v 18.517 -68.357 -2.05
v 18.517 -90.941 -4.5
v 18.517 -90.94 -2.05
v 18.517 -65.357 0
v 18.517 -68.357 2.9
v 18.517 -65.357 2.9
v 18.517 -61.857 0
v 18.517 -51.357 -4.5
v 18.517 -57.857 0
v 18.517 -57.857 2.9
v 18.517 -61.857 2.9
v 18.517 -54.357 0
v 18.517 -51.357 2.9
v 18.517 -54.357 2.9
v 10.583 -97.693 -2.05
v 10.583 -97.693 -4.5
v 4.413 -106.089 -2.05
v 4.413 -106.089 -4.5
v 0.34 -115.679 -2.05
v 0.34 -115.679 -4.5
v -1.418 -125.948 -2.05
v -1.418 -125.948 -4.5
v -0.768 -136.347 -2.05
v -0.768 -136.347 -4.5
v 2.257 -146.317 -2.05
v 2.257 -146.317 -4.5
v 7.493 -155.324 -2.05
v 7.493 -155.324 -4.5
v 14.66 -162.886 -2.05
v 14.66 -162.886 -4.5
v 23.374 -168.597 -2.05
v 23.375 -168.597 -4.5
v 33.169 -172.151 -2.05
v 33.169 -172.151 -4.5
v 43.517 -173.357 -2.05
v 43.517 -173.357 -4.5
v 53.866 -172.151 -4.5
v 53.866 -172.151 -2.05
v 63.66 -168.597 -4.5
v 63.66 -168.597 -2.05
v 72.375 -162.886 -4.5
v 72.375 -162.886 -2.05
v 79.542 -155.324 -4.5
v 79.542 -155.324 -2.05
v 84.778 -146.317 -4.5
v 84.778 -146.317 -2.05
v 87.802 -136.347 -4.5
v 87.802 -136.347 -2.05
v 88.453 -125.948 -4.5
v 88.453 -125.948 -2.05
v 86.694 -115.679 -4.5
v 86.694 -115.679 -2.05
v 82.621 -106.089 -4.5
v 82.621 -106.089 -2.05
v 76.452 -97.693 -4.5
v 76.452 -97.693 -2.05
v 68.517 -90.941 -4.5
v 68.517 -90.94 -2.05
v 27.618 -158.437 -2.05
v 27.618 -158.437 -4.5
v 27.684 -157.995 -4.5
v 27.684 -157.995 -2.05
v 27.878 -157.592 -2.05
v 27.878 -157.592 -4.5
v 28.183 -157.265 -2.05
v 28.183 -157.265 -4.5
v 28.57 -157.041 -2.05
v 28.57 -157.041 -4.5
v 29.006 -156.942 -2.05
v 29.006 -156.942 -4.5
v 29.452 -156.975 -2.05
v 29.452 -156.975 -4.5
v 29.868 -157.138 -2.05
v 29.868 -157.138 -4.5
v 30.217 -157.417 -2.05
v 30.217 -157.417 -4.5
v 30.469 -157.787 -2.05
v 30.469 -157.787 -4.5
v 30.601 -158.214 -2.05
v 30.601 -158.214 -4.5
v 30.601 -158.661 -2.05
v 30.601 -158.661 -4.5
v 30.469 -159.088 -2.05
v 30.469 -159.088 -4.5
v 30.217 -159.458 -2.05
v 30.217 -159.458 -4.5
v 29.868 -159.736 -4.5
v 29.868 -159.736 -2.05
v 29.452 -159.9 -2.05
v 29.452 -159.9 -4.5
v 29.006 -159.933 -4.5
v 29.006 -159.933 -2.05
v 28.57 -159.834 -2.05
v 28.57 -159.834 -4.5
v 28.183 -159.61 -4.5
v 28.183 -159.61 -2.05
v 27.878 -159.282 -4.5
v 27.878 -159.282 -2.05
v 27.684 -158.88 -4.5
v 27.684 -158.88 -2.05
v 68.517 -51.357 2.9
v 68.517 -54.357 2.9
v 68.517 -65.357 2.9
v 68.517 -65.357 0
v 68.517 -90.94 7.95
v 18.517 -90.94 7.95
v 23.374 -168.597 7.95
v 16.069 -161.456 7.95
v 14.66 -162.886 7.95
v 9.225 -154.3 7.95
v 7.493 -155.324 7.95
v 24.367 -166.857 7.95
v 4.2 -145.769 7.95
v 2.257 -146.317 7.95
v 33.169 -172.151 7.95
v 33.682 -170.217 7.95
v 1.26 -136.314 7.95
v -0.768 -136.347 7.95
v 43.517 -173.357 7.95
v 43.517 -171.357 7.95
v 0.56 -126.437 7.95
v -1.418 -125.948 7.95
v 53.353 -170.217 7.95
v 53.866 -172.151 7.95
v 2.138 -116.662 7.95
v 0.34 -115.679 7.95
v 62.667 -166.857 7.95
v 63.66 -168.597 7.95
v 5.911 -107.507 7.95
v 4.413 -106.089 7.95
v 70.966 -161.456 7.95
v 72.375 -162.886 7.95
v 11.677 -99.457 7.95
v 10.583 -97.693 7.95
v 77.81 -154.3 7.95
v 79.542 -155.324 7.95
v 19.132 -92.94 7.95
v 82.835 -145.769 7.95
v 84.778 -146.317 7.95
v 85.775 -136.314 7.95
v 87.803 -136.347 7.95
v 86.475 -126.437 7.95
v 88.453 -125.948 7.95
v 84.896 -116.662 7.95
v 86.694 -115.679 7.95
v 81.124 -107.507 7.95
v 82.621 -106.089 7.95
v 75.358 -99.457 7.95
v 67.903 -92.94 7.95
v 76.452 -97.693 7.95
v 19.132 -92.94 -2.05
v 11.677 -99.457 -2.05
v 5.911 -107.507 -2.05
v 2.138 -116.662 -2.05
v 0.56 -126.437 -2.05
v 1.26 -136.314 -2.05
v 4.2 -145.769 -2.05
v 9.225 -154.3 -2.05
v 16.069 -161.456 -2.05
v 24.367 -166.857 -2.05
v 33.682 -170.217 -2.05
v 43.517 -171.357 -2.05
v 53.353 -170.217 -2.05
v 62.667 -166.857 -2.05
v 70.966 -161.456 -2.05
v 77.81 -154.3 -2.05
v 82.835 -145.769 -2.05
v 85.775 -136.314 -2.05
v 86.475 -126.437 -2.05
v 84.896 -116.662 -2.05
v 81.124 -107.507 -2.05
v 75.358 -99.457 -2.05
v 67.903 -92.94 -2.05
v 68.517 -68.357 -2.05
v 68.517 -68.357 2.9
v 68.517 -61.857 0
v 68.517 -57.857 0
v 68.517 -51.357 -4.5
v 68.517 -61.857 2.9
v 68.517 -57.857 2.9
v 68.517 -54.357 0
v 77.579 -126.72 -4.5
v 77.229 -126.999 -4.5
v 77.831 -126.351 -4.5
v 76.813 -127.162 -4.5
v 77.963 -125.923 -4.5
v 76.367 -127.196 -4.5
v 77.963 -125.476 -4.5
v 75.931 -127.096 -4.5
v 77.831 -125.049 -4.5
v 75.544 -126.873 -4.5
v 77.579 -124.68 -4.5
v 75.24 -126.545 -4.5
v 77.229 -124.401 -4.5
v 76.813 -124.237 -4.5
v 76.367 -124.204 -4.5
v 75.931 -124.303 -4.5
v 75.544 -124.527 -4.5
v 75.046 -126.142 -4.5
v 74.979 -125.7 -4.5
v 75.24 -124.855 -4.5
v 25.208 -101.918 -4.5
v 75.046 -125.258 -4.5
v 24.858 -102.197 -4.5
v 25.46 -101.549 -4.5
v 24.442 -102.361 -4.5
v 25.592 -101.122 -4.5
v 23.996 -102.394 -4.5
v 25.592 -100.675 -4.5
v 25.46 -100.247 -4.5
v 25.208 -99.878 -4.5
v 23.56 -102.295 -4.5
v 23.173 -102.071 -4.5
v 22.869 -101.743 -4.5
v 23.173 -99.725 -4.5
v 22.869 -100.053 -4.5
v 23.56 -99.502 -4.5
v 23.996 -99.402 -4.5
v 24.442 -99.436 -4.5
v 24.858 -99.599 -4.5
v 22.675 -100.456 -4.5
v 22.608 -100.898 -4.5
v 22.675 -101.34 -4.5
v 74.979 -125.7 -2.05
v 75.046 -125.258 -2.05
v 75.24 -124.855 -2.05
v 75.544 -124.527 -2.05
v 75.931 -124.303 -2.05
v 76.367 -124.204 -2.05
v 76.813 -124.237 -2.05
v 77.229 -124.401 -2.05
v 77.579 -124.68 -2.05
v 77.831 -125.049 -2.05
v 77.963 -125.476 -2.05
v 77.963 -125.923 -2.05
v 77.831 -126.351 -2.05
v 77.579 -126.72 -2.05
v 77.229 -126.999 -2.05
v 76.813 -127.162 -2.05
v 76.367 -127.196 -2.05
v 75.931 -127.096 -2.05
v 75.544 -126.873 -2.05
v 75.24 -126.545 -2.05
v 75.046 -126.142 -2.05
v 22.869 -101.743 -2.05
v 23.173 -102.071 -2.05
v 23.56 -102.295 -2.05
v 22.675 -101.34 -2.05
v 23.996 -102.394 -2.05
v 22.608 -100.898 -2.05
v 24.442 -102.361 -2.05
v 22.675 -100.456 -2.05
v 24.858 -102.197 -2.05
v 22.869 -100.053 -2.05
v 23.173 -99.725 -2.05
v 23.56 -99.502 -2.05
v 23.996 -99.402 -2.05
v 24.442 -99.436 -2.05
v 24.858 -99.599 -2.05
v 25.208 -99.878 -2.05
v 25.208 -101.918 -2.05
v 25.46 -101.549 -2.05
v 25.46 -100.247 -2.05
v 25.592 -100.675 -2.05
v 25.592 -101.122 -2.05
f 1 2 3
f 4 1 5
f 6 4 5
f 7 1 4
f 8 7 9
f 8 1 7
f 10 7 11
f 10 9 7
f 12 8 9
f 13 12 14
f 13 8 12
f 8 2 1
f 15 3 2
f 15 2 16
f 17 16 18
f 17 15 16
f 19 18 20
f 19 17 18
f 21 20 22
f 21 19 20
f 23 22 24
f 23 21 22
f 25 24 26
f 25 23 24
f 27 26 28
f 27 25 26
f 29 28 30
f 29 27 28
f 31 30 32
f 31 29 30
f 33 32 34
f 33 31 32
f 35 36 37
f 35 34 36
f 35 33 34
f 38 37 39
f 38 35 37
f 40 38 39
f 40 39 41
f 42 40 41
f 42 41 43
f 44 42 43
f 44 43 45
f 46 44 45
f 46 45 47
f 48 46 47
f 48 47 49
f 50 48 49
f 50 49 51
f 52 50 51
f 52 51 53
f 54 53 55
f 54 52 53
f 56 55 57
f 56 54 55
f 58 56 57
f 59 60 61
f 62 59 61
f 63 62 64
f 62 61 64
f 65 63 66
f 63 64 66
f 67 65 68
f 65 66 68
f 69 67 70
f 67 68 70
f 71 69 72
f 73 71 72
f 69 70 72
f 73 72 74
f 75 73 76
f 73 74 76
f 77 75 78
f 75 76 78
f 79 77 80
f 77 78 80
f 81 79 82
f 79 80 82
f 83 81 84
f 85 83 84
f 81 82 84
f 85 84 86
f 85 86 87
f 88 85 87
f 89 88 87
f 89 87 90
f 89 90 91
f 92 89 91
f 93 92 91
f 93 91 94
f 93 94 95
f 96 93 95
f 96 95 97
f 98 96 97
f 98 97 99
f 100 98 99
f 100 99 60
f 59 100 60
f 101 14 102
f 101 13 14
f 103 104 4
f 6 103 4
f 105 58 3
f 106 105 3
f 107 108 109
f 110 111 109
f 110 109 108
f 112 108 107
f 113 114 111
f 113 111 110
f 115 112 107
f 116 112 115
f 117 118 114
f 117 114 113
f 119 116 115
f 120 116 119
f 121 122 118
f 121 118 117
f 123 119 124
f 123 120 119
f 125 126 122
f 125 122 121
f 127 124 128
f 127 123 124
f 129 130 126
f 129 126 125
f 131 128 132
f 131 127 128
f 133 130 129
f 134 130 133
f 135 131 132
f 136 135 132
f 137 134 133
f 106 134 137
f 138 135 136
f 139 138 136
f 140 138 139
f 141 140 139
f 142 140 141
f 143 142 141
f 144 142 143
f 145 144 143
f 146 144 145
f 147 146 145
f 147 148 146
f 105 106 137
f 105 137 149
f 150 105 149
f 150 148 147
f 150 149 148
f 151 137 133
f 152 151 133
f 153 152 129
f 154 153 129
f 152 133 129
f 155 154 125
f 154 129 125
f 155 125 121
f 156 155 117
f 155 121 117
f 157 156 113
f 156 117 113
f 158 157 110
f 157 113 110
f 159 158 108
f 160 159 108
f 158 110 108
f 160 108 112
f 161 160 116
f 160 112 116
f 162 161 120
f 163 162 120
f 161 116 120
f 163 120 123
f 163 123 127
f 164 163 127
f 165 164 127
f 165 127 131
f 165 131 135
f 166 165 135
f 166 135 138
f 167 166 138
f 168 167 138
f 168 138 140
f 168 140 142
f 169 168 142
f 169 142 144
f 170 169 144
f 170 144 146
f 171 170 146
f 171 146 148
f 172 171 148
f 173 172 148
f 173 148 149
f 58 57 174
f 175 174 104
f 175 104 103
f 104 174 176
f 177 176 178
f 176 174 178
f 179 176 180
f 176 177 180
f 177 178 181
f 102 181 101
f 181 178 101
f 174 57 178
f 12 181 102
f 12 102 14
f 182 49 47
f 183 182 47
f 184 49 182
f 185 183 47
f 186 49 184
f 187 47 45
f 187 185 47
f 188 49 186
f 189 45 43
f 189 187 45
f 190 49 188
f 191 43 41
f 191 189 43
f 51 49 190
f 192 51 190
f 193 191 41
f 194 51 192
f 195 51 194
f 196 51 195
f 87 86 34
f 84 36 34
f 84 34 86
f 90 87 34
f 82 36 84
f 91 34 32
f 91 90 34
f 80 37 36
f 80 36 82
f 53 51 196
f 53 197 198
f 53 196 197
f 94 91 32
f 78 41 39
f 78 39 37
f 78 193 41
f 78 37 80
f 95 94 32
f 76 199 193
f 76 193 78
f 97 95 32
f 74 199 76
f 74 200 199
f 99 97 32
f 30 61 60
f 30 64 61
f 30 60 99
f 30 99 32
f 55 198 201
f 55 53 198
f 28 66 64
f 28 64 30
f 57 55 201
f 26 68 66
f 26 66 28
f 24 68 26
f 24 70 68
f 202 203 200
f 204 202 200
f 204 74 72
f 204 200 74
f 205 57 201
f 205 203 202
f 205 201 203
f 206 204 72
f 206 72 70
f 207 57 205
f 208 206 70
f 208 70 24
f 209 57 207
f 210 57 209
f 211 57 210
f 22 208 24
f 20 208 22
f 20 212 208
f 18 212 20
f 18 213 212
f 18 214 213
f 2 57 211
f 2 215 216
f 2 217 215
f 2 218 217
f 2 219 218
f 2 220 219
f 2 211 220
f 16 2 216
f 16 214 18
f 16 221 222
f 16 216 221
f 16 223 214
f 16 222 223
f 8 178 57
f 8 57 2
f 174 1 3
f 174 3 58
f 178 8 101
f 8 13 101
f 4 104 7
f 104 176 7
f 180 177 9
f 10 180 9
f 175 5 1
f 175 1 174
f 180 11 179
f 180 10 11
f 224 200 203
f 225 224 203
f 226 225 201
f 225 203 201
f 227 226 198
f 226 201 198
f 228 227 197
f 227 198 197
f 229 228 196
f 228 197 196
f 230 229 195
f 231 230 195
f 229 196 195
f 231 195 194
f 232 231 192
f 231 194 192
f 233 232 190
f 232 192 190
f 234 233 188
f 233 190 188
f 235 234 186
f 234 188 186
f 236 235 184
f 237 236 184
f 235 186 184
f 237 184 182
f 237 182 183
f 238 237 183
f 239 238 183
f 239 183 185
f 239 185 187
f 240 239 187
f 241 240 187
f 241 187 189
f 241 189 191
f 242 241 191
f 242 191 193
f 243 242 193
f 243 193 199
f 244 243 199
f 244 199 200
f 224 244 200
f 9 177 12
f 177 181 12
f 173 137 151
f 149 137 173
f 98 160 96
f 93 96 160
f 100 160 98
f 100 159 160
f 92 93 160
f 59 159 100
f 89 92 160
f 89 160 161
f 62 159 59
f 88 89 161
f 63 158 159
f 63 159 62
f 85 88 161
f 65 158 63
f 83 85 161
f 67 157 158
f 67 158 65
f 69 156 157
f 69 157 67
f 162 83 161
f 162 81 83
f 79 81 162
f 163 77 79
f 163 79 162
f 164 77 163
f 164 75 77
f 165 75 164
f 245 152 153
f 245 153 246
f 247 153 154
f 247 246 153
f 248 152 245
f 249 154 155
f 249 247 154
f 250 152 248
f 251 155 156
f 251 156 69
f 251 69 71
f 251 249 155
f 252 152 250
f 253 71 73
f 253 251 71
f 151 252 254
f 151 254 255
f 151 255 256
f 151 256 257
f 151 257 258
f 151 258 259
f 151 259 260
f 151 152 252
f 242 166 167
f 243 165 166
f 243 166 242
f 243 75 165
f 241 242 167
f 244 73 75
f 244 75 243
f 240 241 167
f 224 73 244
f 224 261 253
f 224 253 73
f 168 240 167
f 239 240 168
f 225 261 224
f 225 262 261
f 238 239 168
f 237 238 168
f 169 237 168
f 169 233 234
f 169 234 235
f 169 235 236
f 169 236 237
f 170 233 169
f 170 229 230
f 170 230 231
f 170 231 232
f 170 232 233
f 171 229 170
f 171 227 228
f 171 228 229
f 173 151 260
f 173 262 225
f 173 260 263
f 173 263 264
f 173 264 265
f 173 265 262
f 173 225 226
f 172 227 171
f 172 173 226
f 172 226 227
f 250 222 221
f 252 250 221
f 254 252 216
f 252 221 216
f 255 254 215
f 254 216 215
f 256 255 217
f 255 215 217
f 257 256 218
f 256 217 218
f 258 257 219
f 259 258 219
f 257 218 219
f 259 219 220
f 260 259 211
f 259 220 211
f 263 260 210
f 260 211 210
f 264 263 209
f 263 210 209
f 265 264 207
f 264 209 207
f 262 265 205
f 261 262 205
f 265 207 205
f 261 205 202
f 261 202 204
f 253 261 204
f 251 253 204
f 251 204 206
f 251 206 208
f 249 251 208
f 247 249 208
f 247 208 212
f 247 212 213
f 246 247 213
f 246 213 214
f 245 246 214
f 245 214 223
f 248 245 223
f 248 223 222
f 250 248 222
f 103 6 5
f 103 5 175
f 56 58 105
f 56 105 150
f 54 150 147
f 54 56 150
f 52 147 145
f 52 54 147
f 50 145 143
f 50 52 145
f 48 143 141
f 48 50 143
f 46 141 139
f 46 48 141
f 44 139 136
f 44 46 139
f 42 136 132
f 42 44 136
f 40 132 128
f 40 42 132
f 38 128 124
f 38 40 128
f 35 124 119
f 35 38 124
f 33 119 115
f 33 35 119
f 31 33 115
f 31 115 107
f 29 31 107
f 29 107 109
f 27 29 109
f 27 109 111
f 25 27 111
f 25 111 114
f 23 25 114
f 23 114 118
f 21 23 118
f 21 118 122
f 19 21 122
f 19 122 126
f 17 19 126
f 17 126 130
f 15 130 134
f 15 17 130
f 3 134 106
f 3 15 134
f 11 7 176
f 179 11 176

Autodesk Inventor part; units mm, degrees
ref_plane "YZ Plane" through (0, 0, 0) normal (1, 0, 0) x (0, 1, 0)
ref_plane "XZ Plane" through (0, 0, 0) normal (0, 1, 0) x (-1, 0, 0)
ref_plane "XY Plane" through (0, 0, 0) normal (0, 0, 1) x (1, 0, 0)
sketch "Esquisse1" plane through (0, 0, 0) normal (0, 0, 1) x (1, 0, 0)
  line L0 (-65.5174, -57.3571) -> (-65.5174, -54.3571) construction
  line L1 (-65.5174, -57.3571) -> (68.5174, -57.3571) construction
  line L2 (68.5174, -54.3571) -> (68.5174, -57.3571) construction
  line L3 (68.5174, -54.3571) -> (-65.5174, -54.3571) construction
  line L4 (-65.5174, -65.3571) -> (-65.5174, -62.3571) construction
  line L5 (-65.5174, -65.3571) -> (68.5174, -65.3571) construction
  line L6 (68.5174, -62.3571) -> (68.5174, -65.3571) construction
  line L7 (68.5174, -62.3571) -> (-65.5174, -62.3571) construction
  line L8 (68.5174, -54.3571) -> (-65.5174, -65.3571) construction
  line L9 (-65.5174, -54.3571) -> (68.5174, -65.3571) construction
  line L10 (-65.5174, -61.8571) -> (68.5174, -61.8571)
  line L11 (68.5174, -61.8571) -> (68.5174, -57.8571)
  line L12 (68.5174, -57.8571) -> (-65.5174, -57.8571)
  line L13 (-65.5174, -57.8571) -> (-65.5174, -61.8571)
  line L14 (-65.5174, -61.8571) -> (68.5174, -57.8571) construction
  line L15 (68.5174, -61.8571) -> (-65.5174, -57.8571) construction
  line L16 (68.5174, -54.3571) -> (18.5174, -54.3571)
  line L17 (18.5174, -54.3571) -> (18.5174, -51.3571)
  line L18 (18.5174, -51.3571) -> (68.5174, -51.3571)
  line L19 (68.5174, -51.3571) -> (68.5174, -54.3571)
  line L20 (68.5174, -65.3571) -> (18.5174, -65.3571)
  line L21 (18.5174, -65.3571) -> (18.5174, -68.3571)
  line L22 (18.5174, -68.3571) -> (68.5174, -68.3571)
  line L23 (68.5174, -68.3571) -> (68.5174, -65.3571)
  line L24 (18.5174, -57.8571) -> (18.5174, -61.8571)
  point P0 (0, 0)
  point P1 (1.5, -59.8571)
  dimension "d1" = 0.5
  dimension "d2" = 50
  dimension "d3" = 3
  dimension "d4" = 3
extrude "Extrusion1" add sketch "Esquisse1" along normal blind 2.9 contours L24 L12 L11 L10 | L16 L17 L18 L19 | L23 L22 L21 L20
sketch "Esquisse13" plane through (0, 0, 0) normal (0, 0, -1) x (-1, 0, 0)
  line L0 (-68.5174, -68.3571) -> (-68.5174, -65.3571) projected
  line L1 (-18.5174, -51.3571) -> (-68.5174, -51.3571)
  line L2 (-68.5174, -51.3571) -> (-68.5174, -68.3571)
  line L3 (-68.5174, -68.3571) -> (-18.5174, -68.3571)
  line L4 (-18.5174, -68.3571) -> (-18.5174, -51.3571)
  point P0 (0, 0)
extrude "Extrusion12" add sketch "Esquisse13" along normal blind 2
sketch "Esquisse24" plane through (0, 0, -2) normal (0, 0, -1) x (-1, 0, 0)
  line L0 (-18.5174, -65.3571) -> (-18.5174, -68.3571) projected
  line L1 (-18.5174, -51.3571) -> (-68.5174, -51.3571) projected
  line L2 (-18.5174, -68.3571) -> (-68.5174, -68.3571)
  line L3 (-68.5174, -68.3571) -> (-68.5174, -51.3571)
  line L4 (-68.5174, -51.3571) -> (-18.5174, -51.3571)
  line L5 (-18.5174, -51.3571) -> (-18.5174, -68.3571)
  point P0 (0, 0)
extrude "Extrusion21" add sketch "Esquisse24" along normal blind 5
sketch "Esquisse25" plane through (18.5174, -68.3571, 2.9) normal (0, -1, 0) x (1, 0, 0)
  line L0 (50, -9.9) -> (50, 0) projected
  line L1 (50, -9.9) -> (0, -9.9)
  line L2 (0, -9.9) -> (0, -4.95)
  line L3 (0, -4.95) -> (50, -4.95)
  line L4 (50, -4.95) -> (50, -9.9)
  line L5 (0, -9.9) -> (0, 0) construction
  point P0 (-18.5174, -2.9)
extrude "Extrusion22" add sketch "Esquisse25" along normal blind 15
sketch "Esquisse26" plane through (18.5174, -68.3571, -2.05) normal (0, 0, 1) x (1, 0, 0)
  line L0 (50, -15) -> (0, -15) projected
  line L1 (0, 0) -> (50, 0) projected
  line L2 (0, -15) -> (50, 0)
  line L3 (0, 0) -> (50, -15)
  line L4 (25, -7.5) -> (25, -60)
  circle A0 centre (25, -60) radius 45
  line L5 (0, -15) -> (50, -15) projected
  line L6 (0, -15) -> (0, -22.5834)
  line L7 (50, 0) -> (50, -15) projected
  line L8 (50, -15) -> (50, -22.5834)
  line L9 (0, -15) -> (25, -15)
  line L10 (25, -15) -> (50, -15)
  point P0 (-18.5174, 68.3571)
  dimension "d89" = 90
extrude "Extrusion23" add sketch "Esquisse26" against normal up to surface (4.95 mm away) contours L8 A0 L0 | A0 L6 L0 | A0
sketch "Esquisse27" plane through (0, 0, -7) normal (0, 0, -1) x (-1, 0, 0)
  line L0 (-18.5174, -51.3571) -> (-18.5174, -90.9406) projected
  line L1 (-18.5174, -51.3571) -> (-68.5174, -51.3571) projected
  line L2 (-68.5174, -51.3571) -> (-68.5174, -90.9406) projected
  arc A0 (-68.5174, -90.9406) -> (-18.5174, -90.9406) centre (-43.5174, -128.3571) ccw projected
  point P0 (0, 0)
extrude "Extrusion24" cut sketch "Esquisse27" against normal blind 2.5
sketch "Esquisse28" plane through (18.5174, -68.3571, -2.05) normal (0, 0, 1) x (1, 0, 0)
  arc A0 (0, -22.5834) -> (50, -22.5834) centre (25, -60) ccw construction
  line L0 (25, -60) -> (-20, -60)
  point P0 (-18.5174, 68.3571)
ref_plane "Plan de construction5" through (43.5174, -128.3571, -2.05) normal (0, -1, 0) x (1, 0, 0)
ref_plane "Plan de construction6" through (43.5174, -128.3571, -2.05) normal (-1, 0, 0) x (0, -1, 0)
sketch "Esquisse29" plane through (0, 0, -4.5) normal (0, 0, -1) x (-1, 0, 0)
  circle A0 centre (-29.1178, -158.4374) radius 1.5 projected
  circle A1 centre (-24.1083, -100.8982) radius 1.5 projected
  circle A2 centre (-76.4793, -125.6998) radius 1.5 projected
  point P0 (0, 0)
extrude "Extrusion25" cut sketch "Esquisse29" against normal blind 15
sketch "Esquisse30" plane through (18.5174, -68.3571, -2.05) normal (0, 0, 1) x (1, 0, 0)
  circle A0 centre (57.9619, -57.3427) radius 1.5 projected
  circle A1 centre (10.6003, -90.0802) radius 1.5 projected
  circle A2 centre (5.5909, -32.541) radius 1.5 projected
  line L0 (0, 0) -> (50, 0) projected
  line L1 (0, 0) -> (0, -22.5834) projected
  arc A3 (0, -22.5834) -> (50, -22.5834) centre (25, -60) ccw projected
  line L2 (50, 0) -> (50, -22.5834) projected
  line L3 (50, -22.5834) -> (50, 17) projected
  line L4 (50, -22.5834) -> (0, -22.5834)
  point P0 (-18.5174, 68.3571)
  point P1 (0, -22.5834)
extrude "Extrusion26" add sketch "Esquisse30" along normal blind 10 contours L4 A3
sketch "Esquisse31" plane through (0, 0, -4.5) normal (0, 0, -1) x (-1, 0, 0)
  line L0 (-97.6483, -128.3571) -> (22.3325, -128.3571) projected
  line L1 (-43.5174, -178.8817) -> (-43.5174, -79.6766) projected
  circle A0 centre (-43.5174, -128.3571) radius 43
  arc A1 (-68.5174, -90.9406) -> (-18.5174, -90.9406) centre (-43.5174, -128.3571) ccw projected
  line L2 (-68.5174, -68.3571) -> (-68.5174, -90.9406) projected
  line L3 (-68.5174, -90.9406) -> (-18.5174, -90.9406)
  point P0 (0, 0)
  point P1 (-64.707, -90.9406)
  point P2 (-22.3278, -90.9406)
  dimension "d98" = 2
sketch "Esquisse34" plane through (18.5174, -68.3571, 7.95) normal (0, 0, 1) x (1, 0, 0)
  arc A0 (0, -22.5834) -> (50, -22.5834) centre (25, -60) ccw projected
  line L0 (50, -22.5834) -> (0, -22.5834) projected
  circle A1 centre (5.5909, -32.541) radius 1.5 projected
  circle A2 centre (10.6003, -90.0802) radius 1.5 projected
  circle A3 centre (57.9619, -57.3427) radius 1.5 projected
  arc A4 (0.6142, -24.5834) -> (49.3858, -24.5834) centre (25, -60) ccw
  line L1 (0.6142, -24.5834) -> (49.3858, -24.5834)
  point P0 (-18.5174, 68.3571)
  dimension "d103" = 2
extrude "Extrusion29" cut sketch "Esquisse34" against normal blind 10 contours L1 A4
sketch "Esquisse35" plane through (43.5174, -128.3571, -2.05) normal (-1, 0, 0) x (0, -1, 0)
  line L0 (0, 9.1389) -> (0, 21.1265) construction
  circle A0 centre (0, 15.1327) radius 2
  point P0 (-128.3571, 2.05)
  dimension "d106" = 4
properties part number "rainHolder_Impression 3D"
